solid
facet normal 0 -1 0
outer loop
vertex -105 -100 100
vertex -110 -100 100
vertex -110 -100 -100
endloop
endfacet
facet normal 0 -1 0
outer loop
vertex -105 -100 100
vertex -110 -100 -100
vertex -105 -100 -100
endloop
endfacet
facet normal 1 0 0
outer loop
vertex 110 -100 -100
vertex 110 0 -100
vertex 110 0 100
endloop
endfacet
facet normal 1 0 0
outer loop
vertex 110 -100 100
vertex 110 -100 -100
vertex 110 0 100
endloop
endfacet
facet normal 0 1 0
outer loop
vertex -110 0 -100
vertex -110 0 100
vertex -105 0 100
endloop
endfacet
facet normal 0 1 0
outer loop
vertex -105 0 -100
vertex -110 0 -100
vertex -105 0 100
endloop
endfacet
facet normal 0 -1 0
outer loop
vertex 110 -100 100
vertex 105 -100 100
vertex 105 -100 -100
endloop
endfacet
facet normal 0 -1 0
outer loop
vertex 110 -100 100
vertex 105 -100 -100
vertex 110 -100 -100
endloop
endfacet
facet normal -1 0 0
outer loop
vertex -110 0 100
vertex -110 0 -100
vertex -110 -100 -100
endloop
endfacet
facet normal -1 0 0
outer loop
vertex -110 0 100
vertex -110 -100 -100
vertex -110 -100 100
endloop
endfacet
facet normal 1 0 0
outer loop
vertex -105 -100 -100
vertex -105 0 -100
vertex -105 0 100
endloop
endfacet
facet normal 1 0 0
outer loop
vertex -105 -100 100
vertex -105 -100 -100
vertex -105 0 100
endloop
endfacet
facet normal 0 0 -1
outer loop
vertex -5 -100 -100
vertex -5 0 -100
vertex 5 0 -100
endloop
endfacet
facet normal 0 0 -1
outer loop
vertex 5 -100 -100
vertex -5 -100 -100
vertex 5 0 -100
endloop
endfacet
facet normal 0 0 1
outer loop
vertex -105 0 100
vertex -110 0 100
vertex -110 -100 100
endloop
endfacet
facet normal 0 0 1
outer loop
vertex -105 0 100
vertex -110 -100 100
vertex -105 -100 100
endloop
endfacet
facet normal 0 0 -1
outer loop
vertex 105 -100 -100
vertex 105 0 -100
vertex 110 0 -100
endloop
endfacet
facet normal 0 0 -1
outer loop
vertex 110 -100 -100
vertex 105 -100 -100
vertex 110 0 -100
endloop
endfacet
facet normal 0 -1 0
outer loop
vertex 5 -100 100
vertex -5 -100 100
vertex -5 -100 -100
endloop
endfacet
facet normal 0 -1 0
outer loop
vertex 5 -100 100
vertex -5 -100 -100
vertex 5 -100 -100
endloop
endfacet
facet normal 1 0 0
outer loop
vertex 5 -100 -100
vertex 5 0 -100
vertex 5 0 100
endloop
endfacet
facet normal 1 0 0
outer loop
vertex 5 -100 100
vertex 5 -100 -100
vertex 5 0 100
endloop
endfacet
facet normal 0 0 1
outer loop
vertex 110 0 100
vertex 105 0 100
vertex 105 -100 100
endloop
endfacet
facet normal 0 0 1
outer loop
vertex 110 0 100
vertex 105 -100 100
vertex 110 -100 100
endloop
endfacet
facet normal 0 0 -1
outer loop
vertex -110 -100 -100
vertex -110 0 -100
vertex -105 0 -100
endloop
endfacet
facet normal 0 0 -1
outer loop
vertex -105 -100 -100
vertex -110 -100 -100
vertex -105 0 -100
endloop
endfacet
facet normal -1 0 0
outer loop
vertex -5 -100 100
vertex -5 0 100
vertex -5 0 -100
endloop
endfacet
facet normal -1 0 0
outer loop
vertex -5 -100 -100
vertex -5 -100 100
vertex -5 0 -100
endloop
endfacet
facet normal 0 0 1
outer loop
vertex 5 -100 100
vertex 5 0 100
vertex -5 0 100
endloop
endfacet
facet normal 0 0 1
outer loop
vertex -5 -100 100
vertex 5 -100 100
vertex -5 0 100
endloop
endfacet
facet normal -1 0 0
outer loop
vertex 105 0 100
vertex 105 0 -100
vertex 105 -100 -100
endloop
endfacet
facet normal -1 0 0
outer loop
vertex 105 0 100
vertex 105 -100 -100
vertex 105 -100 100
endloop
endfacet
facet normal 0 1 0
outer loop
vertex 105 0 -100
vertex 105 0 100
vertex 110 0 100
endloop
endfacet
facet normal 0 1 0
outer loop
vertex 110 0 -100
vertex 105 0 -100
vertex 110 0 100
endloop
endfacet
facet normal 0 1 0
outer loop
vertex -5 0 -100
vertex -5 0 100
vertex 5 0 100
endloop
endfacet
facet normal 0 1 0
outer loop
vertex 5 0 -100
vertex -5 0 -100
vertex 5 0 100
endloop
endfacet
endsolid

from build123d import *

# Parameters (mm, degrees)
F0_W     = 5
F0_H     = 200
F1_DEPTH = 100


with BuildPart() as f1:
    # F0 (on Front) → F1 (new body)
    with BuildSketch(Plane.XZ):
        Polygon((0, 100), (0, 0), (0, -100), (5, -100), (5, 0), (5, 100), align=None)
        Polygon((0, -100), (0, 0), (0, 100), (-5, 100), (-5, 0), (-5, -100), align=None)
        with Locations((107.5, 0)):
            Rectangle(F0_W, F0_H)
        with Locations((-107.5, 0)):
            Rectangle(F0_W, F0_H)
    extrude(amount=F1_DEPTH)


solid = f1.part
